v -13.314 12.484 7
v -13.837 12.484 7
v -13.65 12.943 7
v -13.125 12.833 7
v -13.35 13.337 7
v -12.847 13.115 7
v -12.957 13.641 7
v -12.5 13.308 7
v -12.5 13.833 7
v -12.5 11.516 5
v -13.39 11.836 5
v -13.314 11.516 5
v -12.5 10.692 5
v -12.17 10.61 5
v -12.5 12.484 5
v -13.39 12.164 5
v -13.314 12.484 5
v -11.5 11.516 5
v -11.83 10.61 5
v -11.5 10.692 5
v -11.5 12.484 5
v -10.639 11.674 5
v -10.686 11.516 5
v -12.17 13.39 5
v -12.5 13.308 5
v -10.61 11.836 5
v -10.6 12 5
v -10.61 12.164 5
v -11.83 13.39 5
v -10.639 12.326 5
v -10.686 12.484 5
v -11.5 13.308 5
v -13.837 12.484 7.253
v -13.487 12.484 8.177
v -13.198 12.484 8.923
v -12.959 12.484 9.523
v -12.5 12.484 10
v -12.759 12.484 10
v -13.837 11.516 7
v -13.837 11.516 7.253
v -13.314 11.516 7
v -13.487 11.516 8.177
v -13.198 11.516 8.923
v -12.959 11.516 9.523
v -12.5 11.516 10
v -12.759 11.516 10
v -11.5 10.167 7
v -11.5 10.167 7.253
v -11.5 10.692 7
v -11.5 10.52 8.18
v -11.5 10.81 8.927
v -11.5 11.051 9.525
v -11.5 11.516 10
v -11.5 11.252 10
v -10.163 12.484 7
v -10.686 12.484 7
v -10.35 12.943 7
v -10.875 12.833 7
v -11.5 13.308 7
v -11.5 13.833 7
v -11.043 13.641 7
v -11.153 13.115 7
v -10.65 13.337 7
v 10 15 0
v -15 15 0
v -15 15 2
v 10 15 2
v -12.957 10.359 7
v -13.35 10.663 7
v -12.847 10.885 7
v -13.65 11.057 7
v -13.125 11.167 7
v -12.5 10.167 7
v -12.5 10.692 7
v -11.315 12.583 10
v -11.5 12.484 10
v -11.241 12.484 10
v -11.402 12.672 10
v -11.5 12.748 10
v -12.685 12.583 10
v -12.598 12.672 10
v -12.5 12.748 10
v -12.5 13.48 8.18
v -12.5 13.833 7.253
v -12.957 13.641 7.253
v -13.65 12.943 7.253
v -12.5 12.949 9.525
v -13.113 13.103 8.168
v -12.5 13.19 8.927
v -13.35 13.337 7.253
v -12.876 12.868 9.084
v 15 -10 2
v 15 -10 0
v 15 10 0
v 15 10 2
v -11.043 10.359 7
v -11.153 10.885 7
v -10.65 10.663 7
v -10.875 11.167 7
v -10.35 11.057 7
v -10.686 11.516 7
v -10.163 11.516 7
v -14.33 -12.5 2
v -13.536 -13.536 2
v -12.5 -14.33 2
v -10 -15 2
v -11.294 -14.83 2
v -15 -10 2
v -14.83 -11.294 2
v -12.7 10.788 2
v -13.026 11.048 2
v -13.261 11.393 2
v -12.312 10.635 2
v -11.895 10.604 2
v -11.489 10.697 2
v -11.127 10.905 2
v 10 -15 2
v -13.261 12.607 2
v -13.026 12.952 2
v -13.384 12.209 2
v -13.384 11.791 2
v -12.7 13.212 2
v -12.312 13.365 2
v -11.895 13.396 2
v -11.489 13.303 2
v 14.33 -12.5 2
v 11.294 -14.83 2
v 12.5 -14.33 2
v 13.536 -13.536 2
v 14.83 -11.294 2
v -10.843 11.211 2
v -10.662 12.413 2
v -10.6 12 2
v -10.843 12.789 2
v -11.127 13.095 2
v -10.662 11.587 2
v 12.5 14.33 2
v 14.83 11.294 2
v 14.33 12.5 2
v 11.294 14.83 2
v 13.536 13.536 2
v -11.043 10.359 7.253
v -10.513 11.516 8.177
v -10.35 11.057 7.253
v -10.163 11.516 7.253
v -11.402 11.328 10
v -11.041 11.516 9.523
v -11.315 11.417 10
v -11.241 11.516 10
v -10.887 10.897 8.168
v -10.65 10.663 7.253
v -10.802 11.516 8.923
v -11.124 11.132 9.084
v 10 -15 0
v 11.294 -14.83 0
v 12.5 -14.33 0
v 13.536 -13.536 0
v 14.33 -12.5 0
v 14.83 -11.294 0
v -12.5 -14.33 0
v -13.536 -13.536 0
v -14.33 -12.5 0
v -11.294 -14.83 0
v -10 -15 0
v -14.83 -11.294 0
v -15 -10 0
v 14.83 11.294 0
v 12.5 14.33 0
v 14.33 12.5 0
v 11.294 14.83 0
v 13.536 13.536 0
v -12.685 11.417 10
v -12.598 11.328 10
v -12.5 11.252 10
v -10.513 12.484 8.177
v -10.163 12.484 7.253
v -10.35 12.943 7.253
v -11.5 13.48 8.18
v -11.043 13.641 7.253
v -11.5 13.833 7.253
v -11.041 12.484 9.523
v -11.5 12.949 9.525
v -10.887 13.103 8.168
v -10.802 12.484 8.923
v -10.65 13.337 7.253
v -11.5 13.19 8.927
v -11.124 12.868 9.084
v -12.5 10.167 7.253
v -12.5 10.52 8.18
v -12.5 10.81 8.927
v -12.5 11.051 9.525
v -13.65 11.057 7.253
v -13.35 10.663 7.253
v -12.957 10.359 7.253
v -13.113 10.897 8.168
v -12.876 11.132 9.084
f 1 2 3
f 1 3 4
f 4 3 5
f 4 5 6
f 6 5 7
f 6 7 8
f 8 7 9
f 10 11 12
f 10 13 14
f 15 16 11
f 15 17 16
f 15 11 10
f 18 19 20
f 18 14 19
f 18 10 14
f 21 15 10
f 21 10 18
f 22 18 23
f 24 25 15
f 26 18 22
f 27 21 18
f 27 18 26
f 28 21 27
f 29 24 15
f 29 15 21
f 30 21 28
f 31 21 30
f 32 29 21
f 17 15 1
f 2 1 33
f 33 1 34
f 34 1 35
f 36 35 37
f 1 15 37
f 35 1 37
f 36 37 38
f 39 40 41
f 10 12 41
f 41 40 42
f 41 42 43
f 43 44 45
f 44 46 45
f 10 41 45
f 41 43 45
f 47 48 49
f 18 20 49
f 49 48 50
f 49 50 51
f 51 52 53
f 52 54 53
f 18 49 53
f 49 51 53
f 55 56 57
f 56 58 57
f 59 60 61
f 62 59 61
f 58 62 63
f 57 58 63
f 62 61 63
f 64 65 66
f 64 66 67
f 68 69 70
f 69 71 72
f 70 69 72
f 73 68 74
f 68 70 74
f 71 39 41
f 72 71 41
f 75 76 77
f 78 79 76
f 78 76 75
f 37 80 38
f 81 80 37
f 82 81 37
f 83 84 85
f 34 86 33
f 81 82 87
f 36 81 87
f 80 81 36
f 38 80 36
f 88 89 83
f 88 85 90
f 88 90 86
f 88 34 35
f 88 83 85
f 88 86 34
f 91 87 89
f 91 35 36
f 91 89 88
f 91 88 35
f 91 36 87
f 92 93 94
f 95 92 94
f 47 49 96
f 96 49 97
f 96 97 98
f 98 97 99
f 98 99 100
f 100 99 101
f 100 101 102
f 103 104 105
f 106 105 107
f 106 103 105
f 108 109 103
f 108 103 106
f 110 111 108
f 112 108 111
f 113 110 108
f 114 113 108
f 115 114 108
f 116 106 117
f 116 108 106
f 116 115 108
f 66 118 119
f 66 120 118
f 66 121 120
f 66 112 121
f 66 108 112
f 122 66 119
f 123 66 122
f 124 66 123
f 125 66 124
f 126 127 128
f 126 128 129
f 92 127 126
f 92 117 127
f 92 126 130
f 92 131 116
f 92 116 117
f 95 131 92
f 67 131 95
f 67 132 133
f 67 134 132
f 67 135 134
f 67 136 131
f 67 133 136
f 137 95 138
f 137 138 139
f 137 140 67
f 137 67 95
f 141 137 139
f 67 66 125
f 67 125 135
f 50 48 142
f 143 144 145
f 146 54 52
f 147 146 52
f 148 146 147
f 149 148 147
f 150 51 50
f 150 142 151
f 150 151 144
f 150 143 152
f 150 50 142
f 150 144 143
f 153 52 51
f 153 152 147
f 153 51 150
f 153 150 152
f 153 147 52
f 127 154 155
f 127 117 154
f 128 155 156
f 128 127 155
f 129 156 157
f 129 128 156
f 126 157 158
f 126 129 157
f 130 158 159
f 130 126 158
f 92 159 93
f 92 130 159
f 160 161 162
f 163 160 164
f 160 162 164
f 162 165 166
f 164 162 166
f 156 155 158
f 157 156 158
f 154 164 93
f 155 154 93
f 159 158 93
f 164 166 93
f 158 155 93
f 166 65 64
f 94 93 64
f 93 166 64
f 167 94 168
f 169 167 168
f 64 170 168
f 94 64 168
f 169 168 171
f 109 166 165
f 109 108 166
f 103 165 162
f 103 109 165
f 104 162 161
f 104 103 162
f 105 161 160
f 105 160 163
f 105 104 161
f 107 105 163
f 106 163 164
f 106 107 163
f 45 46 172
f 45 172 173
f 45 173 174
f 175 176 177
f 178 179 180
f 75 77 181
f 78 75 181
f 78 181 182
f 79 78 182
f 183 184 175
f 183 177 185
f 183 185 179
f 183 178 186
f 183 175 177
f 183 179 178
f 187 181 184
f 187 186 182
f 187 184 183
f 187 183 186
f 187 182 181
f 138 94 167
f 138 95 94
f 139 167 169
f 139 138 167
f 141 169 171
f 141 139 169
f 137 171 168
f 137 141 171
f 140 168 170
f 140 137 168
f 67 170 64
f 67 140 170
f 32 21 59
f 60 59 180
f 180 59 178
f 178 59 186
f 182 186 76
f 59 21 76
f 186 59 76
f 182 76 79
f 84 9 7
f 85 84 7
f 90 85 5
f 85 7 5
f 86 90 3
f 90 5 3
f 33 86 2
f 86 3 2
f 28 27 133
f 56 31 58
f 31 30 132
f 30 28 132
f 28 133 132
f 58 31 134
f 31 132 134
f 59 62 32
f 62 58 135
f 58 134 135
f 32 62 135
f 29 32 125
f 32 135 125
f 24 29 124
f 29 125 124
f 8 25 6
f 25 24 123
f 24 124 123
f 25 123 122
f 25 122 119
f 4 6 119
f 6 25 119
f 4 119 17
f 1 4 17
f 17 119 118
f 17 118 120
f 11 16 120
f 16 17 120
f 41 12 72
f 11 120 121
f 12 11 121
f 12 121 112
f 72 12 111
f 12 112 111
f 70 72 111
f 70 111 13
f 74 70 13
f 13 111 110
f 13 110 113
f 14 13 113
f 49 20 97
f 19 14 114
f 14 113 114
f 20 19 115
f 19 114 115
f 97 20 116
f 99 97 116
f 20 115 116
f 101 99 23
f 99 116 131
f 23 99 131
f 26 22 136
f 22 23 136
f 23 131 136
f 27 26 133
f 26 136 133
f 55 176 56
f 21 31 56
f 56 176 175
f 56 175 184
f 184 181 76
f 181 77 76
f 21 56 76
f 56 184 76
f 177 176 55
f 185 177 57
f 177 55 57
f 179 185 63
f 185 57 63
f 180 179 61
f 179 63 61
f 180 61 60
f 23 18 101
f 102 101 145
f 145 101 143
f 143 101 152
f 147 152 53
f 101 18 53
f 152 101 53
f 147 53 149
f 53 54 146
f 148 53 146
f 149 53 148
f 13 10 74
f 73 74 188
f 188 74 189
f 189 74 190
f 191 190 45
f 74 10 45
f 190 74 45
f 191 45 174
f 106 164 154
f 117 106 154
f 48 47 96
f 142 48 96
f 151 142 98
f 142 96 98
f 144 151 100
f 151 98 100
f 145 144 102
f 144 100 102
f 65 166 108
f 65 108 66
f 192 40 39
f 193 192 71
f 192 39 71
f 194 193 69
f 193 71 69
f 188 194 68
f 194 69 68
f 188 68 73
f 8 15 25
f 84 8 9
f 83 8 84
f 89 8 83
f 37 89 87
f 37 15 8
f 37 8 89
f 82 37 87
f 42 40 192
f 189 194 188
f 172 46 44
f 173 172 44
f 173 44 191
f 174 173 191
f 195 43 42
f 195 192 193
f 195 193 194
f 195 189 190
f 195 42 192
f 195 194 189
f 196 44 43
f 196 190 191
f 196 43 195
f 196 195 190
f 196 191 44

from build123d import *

# Parameters (mm, degrees)
F0_W       = 30
F0_H       = 30
F1_DEPTH   = 2
F2_R       = 5
F3_R       = 1.4
F4_DEPTH   = 5
F5_R       = 1.9
F6_DEPTH   = 3
F7_W       = 1
F7_H       = 1.4164627314
F7_H_2     = 0.9670745373
F8_DEPTH   = 5
F9_SIZE2   = 1
F9_SIZE    = 2.7474774195
F9_2_SIZE2 = 1
F9_2_SIZE  = 2.7474774195
F9_3_SIZE2 = 1
F9_3_SIZE  = 2.7474774195
F9_4_SIZE2 = 1
F9_4_SIZE  = 2.7474774195


with BuildPart() as f1:
    # F0 (on Top) → F1 (new body)
    with BuildSketch(Plane.XY):
        Rectangle(F0_W, F0_H)
    extrude(amount=F1_DEPTH)

    # F2
    f2_edges = [f1.edges().sort_by_distance(p)[0] for p in [
        (-15, -15, 1),
        (15, -15, 1),
        (15, 15, 1),
    ]]
    fillet(f2_edges, radius=F2_R)

    # F3 (on face) → F4 (join)
    with BuildSketch(Plane.XY.offset(2)):
        with Locations((-12, 12)):
            Circle(F3_R)
    extrude(amount=F4_DEPTH)

    # F5 (on face) → F6 (join)
    with BuildSketch(Plane.XY.offset(7)):
        with Locations((-12, 12)):
            Circle(F5_R)
    extrude(amount=F6_DEPTH)

    # F7 (on face) → F8 (cut)
    with BuildSketch(Plane.XY.offset(10)):
        Polygon((-11.5, 11.5164627314), (-9.9080650799, 11.5164627314), (-10.1625583792, 12.4835372686), (-11.5, 12.4835372686), align=None)
        with Locations((-12, 10.8082313657)):
            Rectangle(F7_W, F7_H)
        with Locations((-12, 12)):
            Rectangle(F7_W, F7_H_2)
        Polygon((-13.8374416208, 11.5164627314), (-12.5, 11.5164627314), (-12.5, 12.4835372686), (-14.0919349201, 12.4835372686), align=None)
        with Locations((-12, 13.1917686343)):
            Rectangle(F7_W, F7_H)
    extrude(amount=-F8_DEPTH, mode=Mode.SUBTRACT)

    # F9
    f9_edges = [f1.edges().sort_by_distance(p)[0] for p in [
        (-10.650485, 13.337464, 10),
    ]]
    f9_side = f1.faces().sort_by_distance((-10.650485, 13.337464, 8.5))[0]
    chamfer(f9_edges, length=F9_SIZE, length2=F9_SIZE2, reference=f9_side)

    # F9#2
    f9_2_edges = [f1.edges().sort_by_distance(p)[0] for p in [
        (-10.650485, 10.662536, 10),
    ]]
    f9_2_side = f1.faces().sort_by_distance((-10.650485, 10.662536, 8.5))[0]
    chamfer(f9_2_edges, length=F9_2_SIZE, length2=F9_2_SIZE2, reference=f9_2_side)

    # F9#3
    f9_3_edges = [f1.edges().sort_by_distance(p)[0] for p in [
        (-13.349515, 13.337464, 10),
    ]]
    f9_3_side = f1.faces().sort_by_distance((-13.349515, 13.337464, 8.5))[0]
    chamfer(f9_3_edges, length=F9_3_SIZE, length2=F9_3_SIZE2, reference=f9_3_side)

    # F9#4
    f9_4_edges = [f1.edges().sort_by_distance(p)[0] for p in [
        (-13.349515, 10.662536, 10),
    ]]
    f9_4_side = f1.faces().sort_by_distance((-13.349515, 10.662536, 8.5))[0]
    chamfer(f9_4_edges, length=F9_4_SIZE, length2=F9_4_SIZE2, reference=f9_4_side)


solid = f1.part
